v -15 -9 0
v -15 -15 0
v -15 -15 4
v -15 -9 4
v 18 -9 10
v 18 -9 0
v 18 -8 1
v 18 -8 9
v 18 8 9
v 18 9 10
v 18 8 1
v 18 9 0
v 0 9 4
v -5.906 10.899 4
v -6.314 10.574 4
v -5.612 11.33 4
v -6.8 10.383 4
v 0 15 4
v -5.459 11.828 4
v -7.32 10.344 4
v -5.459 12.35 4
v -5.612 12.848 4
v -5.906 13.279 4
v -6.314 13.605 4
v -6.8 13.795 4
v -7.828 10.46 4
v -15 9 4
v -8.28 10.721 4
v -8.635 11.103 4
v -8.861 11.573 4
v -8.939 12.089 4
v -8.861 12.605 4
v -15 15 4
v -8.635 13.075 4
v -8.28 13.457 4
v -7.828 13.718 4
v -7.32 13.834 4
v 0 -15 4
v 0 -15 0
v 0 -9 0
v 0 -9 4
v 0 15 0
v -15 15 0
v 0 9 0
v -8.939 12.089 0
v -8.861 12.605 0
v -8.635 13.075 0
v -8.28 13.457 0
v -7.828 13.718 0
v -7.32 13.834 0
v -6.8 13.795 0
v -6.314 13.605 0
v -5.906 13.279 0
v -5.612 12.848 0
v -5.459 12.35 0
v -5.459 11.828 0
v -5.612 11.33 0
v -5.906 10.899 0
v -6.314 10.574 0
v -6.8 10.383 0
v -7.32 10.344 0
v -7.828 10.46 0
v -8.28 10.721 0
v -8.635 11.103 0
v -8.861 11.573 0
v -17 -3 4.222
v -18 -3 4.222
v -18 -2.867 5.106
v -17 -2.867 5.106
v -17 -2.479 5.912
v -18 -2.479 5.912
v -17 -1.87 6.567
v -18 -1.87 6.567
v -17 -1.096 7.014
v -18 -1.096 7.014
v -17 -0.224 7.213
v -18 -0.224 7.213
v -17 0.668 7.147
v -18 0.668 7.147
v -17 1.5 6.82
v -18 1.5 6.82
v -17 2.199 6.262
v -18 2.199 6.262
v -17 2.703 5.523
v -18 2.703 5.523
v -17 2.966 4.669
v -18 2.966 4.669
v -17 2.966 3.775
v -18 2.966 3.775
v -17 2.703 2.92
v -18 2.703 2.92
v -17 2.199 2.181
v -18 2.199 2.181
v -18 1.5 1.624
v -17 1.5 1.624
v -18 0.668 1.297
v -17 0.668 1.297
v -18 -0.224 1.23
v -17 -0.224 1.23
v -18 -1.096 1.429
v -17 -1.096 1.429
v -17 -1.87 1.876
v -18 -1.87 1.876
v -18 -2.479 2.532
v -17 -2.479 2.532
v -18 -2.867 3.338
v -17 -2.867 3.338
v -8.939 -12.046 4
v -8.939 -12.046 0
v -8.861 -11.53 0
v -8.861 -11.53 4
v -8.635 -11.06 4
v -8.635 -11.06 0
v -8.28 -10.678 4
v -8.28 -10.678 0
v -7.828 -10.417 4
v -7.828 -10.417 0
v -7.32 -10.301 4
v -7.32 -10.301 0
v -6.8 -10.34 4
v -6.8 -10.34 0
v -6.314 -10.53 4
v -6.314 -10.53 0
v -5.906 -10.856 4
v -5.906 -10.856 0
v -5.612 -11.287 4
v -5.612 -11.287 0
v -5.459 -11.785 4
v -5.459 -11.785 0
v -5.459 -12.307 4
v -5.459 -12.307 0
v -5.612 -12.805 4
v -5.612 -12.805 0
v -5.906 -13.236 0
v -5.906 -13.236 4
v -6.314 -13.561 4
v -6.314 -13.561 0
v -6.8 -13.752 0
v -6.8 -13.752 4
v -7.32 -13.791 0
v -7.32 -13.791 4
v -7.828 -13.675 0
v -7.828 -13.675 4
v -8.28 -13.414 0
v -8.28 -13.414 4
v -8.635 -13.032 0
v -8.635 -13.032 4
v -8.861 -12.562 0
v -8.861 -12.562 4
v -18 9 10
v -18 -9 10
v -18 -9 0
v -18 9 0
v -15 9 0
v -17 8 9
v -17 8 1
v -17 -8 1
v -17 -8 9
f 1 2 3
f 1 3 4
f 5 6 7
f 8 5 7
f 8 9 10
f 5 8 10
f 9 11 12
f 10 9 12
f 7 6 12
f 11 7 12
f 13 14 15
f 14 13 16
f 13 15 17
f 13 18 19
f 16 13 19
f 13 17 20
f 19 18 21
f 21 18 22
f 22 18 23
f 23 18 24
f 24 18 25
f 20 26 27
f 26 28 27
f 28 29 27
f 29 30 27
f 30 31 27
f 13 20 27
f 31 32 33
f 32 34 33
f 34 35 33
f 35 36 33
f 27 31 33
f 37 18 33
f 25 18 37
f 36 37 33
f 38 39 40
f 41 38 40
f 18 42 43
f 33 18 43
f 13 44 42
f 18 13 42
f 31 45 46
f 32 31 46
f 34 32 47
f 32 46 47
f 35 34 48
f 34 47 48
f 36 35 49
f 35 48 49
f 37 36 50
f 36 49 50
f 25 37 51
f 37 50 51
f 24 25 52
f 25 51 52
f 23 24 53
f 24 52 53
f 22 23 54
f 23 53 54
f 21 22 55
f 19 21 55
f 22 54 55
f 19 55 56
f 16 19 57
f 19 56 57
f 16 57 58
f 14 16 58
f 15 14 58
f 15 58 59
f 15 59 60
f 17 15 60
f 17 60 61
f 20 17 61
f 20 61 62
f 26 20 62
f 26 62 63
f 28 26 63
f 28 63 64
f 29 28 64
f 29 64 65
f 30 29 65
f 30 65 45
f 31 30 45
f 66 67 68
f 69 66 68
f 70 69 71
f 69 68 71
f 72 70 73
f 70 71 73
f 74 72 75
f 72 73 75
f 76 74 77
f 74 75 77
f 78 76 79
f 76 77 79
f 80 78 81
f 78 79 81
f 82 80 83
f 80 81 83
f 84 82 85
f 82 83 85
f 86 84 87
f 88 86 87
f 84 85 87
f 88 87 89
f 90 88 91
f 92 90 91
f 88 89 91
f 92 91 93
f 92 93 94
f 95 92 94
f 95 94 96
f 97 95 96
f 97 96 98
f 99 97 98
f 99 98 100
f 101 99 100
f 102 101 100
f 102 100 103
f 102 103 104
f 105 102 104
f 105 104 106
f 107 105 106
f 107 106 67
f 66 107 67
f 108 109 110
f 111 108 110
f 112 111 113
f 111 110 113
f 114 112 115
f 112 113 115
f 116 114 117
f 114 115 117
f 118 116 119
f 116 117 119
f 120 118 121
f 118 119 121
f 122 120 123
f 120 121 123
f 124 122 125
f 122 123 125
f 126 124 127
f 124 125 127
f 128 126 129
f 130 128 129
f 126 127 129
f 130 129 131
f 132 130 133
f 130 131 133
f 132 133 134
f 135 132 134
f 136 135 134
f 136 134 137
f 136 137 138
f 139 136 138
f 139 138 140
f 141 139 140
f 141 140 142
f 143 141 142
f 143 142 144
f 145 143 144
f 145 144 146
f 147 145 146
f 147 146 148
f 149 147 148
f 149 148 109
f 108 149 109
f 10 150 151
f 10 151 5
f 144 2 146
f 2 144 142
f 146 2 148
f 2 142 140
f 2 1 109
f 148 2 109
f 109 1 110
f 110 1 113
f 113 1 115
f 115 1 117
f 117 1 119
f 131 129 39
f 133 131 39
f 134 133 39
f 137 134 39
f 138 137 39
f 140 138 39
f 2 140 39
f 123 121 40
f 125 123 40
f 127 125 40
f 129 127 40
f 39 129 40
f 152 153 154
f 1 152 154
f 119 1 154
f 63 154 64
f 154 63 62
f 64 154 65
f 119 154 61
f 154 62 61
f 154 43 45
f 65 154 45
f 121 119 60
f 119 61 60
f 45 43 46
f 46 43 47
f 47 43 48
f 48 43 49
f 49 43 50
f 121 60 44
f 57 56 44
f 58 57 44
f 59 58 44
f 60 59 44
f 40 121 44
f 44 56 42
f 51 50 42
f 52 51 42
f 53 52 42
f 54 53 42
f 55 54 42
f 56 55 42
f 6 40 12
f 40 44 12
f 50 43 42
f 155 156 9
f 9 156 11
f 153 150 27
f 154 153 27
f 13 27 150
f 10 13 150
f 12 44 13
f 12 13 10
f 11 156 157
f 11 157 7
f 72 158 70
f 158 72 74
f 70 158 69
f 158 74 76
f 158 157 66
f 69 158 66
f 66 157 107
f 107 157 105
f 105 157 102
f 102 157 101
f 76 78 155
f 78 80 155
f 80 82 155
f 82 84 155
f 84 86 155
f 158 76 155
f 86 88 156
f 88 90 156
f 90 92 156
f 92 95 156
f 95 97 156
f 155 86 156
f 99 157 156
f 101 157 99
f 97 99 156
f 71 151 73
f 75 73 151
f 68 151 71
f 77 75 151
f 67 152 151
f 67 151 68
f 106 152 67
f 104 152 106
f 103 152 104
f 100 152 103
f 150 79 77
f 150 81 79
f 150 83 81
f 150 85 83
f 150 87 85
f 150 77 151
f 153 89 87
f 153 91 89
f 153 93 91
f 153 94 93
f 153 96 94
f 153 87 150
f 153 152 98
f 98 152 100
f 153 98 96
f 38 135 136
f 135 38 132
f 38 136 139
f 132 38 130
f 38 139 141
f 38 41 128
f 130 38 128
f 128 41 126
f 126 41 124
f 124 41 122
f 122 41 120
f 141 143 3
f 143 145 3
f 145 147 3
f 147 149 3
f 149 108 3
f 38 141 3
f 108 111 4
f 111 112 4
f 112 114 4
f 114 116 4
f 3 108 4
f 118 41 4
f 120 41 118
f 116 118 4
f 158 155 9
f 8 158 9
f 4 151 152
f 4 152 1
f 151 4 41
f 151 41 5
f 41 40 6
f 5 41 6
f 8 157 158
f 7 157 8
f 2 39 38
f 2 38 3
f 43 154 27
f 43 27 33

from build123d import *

# Parameters (mm, degrees)
SKETCH1_W           = 36
SKETCH1_H           = 18
BOSS_EXTRUDE1_DEPTH = 10
SHELL1_T            = -1
SKETCH2_R           = 3
CUT_EXTRUDE1_DEPTH  = 8
SKETCH3_W           = 15
SKETCH3_H           = 6
BOSS_EXTRUDE2_DEPTH = 4
SKETCH4_R           = 1.75
CUT_EXTRUDE2_DEPTH  = 12


with BuildPart() as part:
    # Sketch1 → Boss-Extrude1 (new body)
    with BuildSketch(Plane.XY):
        Rectangle(SKETCH1_W, SKETCH1_H)
    extrude(amount=BOSS_EXTRUDE1_DEPTH)

    # Shell1
    shell1_openings = [part.faces().sort_by_distance(p)[0] for p in [
        (18, 0, 5),
    ]]
    offset(amount=SHELL1_T, openings=shell1_openings, kind=Kind.INTERSECTION)

    # Sketch2 → Cut-Extrude1 (cut)
    with BuildSketch(Plane.ZY.offset(18)):
        with Locations(Location((4.221831089, 0, 0), (0, 0, 270))):
            Circle(SKETCH2_R)
    extrude(amount=-CUT_EXTRUDE1_DEPTH, mode=Mode.SUBTRACT)

    # Sketch3 → Boss-Extrude2 (add)
    with BuildSketch(Plane(origin=(0, 0, 0), x_dir=(-1, 0, 0), z_dir=(0, 0, -1))):
        with Locations((7.5, 12)):
            Rectangle(SKETCH3_W, SKETCH3_H)
        with Locations((7.5, -12)):
            Rectangle(SKETCH3_W, SKETCH3_H)
    extrude(amount=-BOSS_EXTRUDE2_DEPTH)

    # Sketch4 → Cut-Extrude2 (cut)
    with BuildSketch(Plane(origin=(0, 0, 0), x_dir=(-1, 0, 0), z_dir=(0, 0, -1))):
        with Locations((7.189144768, 12.089124741)):
            Circle(SKETCH4_R)
        with Locations((7.189144768, -12.045861265)):
            Circle(SKETCH4_R)
    extrude(amount=-CUT_EXTRUDE2_DEPTH, mode=Mode.SUBTRACT)


solid = part.part
